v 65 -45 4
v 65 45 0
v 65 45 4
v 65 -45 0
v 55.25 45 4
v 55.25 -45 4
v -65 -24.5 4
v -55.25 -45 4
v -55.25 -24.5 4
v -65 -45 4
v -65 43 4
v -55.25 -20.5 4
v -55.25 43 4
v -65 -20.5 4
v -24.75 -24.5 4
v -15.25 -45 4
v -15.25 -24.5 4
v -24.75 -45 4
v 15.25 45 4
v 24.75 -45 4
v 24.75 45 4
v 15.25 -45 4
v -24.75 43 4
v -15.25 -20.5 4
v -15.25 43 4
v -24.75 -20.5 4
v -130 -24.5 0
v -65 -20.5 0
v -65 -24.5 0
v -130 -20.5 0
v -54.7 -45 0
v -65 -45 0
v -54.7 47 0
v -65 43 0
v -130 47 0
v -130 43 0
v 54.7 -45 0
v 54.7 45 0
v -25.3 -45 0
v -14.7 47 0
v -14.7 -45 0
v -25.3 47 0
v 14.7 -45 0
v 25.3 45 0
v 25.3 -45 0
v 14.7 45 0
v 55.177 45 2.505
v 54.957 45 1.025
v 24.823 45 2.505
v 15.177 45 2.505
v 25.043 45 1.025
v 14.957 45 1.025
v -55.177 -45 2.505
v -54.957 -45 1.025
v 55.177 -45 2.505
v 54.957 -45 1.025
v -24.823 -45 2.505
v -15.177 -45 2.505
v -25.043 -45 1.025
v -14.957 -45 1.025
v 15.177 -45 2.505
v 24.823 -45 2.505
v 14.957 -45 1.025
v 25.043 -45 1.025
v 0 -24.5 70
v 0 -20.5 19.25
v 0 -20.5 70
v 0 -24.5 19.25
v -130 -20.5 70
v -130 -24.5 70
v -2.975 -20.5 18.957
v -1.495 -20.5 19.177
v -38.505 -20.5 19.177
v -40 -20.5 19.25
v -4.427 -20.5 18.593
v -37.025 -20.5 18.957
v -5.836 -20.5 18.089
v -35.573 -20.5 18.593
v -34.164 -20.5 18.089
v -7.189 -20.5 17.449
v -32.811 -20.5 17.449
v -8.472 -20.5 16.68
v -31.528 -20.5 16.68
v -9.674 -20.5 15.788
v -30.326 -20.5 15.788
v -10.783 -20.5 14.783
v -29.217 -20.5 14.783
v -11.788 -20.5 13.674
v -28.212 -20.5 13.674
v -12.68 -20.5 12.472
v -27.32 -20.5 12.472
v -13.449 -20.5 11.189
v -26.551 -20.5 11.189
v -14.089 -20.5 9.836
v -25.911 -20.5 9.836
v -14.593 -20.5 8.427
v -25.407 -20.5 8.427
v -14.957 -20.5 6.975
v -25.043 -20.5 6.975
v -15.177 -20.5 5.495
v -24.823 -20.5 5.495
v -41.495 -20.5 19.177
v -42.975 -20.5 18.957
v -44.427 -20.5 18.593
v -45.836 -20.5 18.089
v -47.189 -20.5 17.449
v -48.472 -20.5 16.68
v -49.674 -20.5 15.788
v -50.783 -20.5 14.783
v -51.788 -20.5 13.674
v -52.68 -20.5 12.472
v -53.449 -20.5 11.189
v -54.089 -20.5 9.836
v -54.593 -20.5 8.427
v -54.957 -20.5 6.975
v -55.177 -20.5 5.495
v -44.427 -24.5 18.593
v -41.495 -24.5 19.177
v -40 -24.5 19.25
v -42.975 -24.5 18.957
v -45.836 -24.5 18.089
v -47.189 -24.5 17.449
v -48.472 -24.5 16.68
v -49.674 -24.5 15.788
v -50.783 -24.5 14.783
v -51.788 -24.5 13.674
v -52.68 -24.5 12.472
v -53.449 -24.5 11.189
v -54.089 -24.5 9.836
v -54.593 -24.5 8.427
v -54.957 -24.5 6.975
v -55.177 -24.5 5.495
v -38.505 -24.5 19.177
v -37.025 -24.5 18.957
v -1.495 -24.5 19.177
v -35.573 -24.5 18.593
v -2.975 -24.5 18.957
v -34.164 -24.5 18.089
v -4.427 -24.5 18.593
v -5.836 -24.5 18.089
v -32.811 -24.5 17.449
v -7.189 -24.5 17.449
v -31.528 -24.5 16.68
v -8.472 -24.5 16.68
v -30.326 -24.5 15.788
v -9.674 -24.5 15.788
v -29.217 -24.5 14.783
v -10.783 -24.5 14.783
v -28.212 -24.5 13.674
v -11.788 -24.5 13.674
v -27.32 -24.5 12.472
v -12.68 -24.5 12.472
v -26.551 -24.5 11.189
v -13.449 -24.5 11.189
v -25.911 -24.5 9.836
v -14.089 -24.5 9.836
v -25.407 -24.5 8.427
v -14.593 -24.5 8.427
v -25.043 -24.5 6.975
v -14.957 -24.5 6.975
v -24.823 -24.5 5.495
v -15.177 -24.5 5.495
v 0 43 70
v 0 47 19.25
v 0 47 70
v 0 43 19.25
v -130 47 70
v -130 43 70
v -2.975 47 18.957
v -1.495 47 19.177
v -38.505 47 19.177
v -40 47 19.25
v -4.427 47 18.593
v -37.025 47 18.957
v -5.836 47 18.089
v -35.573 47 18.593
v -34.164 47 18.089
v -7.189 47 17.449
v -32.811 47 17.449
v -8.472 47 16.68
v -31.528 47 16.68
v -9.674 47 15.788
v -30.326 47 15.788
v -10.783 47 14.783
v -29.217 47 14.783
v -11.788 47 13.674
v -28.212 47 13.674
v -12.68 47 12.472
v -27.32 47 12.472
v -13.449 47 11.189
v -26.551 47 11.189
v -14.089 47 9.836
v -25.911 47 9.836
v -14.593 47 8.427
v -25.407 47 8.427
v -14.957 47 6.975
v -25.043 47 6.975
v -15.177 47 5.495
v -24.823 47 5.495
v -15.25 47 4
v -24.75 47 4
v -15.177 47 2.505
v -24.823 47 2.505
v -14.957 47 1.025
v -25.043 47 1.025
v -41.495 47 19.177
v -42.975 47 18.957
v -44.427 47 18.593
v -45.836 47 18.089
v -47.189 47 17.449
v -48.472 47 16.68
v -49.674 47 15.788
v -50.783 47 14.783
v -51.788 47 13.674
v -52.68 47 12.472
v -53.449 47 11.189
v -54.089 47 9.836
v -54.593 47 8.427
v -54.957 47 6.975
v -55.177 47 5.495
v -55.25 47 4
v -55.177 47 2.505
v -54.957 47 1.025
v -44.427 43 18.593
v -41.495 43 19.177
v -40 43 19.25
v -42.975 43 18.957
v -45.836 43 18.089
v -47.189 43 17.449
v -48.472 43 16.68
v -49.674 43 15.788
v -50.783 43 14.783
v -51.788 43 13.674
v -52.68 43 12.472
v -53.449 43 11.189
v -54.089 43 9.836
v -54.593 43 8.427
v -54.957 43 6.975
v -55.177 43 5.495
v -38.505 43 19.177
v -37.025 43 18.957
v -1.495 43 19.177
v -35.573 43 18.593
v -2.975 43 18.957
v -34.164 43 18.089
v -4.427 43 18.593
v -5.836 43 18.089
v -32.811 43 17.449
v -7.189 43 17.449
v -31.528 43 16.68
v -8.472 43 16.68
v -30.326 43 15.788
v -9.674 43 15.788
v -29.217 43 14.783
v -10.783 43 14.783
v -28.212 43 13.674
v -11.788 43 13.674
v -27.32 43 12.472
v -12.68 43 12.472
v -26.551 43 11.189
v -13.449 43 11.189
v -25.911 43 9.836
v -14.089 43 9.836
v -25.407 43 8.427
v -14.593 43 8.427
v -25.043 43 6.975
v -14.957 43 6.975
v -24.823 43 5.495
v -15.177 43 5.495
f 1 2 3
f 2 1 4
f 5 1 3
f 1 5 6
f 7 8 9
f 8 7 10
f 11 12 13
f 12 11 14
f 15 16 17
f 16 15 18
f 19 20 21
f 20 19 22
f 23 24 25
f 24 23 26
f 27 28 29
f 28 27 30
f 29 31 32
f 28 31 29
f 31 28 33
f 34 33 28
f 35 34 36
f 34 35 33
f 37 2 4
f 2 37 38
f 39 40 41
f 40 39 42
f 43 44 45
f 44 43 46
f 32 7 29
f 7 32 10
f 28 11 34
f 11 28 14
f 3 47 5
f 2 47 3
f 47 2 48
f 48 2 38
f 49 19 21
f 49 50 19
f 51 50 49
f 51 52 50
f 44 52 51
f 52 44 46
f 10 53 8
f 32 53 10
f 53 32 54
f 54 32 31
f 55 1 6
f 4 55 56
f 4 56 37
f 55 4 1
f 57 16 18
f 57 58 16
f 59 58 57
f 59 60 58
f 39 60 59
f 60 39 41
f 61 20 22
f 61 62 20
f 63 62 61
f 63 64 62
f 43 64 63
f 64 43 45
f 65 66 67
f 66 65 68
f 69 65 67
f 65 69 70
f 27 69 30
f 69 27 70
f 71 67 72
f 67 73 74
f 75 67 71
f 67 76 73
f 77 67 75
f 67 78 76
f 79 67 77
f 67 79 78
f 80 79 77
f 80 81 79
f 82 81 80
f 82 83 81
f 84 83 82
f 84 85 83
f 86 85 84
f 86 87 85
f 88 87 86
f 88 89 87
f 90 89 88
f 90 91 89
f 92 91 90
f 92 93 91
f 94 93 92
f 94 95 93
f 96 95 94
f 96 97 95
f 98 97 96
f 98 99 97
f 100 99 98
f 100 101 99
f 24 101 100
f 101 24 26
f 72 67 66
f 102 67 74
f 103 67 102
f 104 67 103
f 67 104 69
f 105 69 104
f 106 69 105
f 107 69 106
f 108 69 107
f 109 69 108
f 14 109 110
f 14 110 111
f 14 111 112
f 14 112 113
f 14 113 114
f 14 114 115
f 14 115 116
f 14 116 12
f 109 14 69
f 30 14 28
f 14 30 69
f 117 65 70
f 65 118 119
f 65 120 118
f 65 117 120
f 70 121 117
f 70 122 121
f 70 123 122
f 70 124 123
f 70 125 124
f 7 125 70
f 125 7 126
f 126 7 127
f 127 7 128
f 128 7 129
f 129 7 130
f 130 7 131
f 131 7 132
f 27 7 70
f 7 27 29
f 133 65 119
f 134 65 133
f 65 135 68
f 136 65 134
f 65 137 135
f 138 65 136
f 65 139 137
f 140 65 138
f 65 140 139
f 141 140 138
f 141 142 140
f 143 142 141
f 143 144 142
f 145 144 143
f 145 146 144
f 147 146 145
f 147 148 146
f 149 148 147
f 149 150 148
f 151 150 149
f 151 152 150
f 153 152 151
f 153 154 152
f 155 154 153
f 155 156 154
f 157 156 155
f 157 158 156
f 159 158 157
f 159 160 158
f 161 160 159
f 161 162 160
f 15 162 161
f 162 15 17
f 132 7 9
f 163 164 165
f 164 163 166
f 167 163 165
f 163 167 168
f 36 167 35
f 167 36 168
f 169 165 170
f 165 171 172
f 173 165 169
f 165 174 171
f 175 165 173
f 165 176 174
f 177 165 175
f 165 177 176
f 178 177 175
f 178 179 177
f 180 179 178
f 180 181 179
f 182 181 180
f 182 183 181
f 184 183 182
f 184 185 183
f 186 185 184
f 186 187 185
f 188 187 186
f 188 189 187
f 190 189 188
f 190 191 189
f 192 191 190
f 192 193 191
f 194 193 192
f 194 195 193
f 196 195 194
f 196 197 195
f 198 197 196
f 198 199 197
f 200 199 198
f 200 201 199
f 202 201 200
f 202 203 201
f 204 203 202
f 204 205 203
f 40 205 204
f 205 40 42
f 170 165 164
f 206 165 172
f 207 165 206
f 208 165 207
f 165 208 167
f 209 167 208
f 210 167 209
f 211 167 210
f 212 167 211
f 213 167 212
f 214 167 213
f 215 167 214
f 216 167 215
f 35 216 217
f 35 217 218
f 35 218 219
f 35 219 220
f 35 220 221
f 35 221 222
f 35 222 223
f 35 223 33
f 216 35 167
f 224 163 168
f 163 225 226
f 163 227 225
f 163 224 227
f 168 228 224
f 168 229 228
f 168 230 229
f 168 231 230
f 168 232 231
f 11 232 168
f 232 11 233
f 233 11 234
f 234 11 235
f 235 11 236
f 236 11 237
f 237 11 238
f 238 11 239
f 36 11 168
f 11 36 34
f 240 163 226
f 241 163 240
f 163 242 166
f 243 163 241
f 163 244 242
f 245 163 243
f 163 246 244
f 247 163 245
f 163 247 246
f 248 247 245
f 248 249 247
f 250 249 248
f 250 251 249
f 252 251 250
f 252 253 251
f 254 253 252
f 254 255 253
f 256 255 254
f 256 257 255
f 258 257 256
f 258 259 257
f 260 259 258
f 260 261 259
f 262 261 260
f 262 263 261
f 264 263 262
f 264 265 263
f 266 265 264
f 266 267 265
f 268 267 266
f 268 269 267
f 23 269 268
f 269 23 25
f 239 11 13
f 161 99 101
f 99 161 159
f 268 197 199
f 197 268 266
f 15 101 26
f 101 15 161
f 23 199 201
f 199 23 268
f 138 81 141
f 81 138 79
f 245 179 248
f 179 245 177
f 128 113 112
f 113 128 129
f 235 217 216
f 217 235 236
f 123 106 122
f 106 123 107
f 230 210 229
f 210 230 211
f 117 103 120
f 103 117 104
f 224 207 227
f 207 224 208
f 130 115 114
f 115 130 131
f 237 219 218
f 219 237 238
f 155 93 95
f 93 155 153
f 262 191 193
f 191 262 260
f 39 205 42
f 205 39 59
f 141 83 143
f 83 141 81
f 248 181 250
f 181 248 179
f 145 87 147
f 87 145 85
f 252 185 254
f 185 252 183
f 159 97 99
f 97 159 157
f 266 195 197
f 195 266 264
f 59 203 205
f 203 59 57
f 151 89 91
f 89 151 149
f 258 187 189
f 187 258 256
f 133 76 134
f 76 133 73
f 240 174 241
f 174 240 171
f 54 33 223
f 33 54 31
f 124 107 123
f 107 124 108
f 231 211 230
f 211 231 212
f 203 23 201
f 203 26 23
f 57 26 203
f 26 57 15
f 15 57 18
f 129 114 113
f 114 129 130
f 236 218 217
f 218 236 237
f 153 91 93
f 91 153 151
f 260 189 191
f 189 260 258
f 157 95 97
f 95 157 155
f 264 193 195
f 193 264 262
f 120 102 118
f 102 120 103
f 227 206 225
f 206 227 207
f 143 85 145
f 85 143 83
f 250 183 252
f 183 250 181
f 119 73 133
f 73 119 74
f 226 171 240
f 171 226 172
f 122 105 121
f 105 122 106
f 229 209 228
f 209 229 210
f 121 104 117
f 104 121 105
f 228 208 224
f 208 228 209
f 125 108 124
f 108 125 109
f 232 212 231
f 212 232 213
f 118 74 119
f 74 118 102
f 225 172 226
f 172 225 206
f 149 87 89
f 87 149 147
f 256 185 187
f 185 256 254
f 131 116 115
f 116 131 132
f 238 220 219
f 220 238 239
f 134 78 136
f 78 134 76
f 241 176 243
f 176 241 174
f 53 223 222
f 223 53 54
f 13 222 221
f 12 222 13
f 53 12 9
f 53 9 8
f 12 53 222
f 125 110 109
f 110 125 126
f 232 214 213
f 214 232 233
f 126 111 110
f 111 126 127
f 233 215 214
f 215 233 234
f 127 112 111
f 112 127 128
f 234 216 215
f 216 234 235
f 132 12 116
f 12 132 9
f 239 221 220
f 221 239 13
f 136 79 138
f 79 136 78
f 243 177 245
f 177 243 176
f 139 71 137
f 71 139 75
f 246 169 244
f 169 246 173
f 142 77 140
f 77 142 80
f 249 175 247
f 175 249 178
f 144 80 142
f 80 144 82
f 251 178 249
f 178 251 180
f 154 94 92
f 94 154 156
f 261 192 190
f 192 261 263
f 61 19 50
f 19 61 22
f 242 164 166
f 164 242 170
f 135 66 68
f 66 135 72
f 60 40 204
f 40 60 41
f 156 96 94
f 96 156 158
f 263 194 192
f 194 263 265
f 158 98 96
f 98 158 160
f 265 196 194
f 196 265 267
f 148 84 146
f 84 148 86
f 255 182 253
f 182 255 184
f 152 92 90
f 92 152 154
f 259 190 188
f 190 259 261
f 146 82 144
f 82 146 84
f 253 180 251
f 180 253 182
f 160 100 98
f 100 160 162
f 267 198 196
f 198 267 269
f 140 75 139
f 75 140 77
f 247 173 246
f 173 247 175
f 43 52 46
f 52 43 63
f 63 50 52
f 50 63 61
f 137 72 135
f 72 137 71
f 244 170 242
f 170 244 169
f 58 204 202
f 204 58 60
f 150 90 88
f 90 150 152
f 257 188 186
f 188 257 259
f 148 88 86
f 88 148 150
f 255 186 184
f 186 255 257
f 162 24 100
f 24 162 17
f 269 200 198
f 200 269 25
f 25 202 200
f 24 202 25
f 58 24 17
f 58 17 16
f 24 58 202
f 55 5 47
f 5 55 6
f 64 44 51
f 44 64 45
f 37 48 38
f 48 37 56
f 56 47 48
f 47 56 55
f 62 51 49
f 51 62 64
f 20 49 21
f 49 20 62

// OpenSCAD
// Built by bench/smallmodels/features/compiler.py from a list of features.
$fn = 64;
difference() {
  union() {
    translate([0, 0, 0]) translate([-65, -45, 0]) cube([130, 90, 4]);
    translate([-65, -22.5, 0]) translate([-65, -2, 0]) cube([130, 4, 70]);
    translate([-65, 45, 0]) translate([-65, -2, 0]) cube([130, 4, 70]);
  }
  union() {
    translate([-40, -22.5, 4]) rotate([0, 0, 0]) rotate([90, 0, 0]) cylinder(d = 30.5, h = 1280, center = true);
    translate([0, -22.5, 4]) rotate([0, 0, 0]) rotate([90, 0, 0]) cylinder(d = 30.5, h = 1280, center = true);
    translate([40, -22.5, 4]) rotate([0, 0, 0]) rotate([90, 0, 0]) cylinder(d = 30.5, h = 1280, center = true);
    translate([-40, 22.5, 4]) rotate([0, 0, 0]) rotate([90, 0, 0]) cylinder(d = 30.5, h = 1280, center = true);
    translate([0, 22.5, 4]) rotate([0, 0, 0]) rotate([90, 0, 0]) cylinder(d = 30.5, h = 1280, center = true);
    translate([40, 22.5, 4]) rotate([0, 0, 0]) rotate([90, 0, 0]) cylinder(d = 30.5, h = 1280, center = true);
  }
}
